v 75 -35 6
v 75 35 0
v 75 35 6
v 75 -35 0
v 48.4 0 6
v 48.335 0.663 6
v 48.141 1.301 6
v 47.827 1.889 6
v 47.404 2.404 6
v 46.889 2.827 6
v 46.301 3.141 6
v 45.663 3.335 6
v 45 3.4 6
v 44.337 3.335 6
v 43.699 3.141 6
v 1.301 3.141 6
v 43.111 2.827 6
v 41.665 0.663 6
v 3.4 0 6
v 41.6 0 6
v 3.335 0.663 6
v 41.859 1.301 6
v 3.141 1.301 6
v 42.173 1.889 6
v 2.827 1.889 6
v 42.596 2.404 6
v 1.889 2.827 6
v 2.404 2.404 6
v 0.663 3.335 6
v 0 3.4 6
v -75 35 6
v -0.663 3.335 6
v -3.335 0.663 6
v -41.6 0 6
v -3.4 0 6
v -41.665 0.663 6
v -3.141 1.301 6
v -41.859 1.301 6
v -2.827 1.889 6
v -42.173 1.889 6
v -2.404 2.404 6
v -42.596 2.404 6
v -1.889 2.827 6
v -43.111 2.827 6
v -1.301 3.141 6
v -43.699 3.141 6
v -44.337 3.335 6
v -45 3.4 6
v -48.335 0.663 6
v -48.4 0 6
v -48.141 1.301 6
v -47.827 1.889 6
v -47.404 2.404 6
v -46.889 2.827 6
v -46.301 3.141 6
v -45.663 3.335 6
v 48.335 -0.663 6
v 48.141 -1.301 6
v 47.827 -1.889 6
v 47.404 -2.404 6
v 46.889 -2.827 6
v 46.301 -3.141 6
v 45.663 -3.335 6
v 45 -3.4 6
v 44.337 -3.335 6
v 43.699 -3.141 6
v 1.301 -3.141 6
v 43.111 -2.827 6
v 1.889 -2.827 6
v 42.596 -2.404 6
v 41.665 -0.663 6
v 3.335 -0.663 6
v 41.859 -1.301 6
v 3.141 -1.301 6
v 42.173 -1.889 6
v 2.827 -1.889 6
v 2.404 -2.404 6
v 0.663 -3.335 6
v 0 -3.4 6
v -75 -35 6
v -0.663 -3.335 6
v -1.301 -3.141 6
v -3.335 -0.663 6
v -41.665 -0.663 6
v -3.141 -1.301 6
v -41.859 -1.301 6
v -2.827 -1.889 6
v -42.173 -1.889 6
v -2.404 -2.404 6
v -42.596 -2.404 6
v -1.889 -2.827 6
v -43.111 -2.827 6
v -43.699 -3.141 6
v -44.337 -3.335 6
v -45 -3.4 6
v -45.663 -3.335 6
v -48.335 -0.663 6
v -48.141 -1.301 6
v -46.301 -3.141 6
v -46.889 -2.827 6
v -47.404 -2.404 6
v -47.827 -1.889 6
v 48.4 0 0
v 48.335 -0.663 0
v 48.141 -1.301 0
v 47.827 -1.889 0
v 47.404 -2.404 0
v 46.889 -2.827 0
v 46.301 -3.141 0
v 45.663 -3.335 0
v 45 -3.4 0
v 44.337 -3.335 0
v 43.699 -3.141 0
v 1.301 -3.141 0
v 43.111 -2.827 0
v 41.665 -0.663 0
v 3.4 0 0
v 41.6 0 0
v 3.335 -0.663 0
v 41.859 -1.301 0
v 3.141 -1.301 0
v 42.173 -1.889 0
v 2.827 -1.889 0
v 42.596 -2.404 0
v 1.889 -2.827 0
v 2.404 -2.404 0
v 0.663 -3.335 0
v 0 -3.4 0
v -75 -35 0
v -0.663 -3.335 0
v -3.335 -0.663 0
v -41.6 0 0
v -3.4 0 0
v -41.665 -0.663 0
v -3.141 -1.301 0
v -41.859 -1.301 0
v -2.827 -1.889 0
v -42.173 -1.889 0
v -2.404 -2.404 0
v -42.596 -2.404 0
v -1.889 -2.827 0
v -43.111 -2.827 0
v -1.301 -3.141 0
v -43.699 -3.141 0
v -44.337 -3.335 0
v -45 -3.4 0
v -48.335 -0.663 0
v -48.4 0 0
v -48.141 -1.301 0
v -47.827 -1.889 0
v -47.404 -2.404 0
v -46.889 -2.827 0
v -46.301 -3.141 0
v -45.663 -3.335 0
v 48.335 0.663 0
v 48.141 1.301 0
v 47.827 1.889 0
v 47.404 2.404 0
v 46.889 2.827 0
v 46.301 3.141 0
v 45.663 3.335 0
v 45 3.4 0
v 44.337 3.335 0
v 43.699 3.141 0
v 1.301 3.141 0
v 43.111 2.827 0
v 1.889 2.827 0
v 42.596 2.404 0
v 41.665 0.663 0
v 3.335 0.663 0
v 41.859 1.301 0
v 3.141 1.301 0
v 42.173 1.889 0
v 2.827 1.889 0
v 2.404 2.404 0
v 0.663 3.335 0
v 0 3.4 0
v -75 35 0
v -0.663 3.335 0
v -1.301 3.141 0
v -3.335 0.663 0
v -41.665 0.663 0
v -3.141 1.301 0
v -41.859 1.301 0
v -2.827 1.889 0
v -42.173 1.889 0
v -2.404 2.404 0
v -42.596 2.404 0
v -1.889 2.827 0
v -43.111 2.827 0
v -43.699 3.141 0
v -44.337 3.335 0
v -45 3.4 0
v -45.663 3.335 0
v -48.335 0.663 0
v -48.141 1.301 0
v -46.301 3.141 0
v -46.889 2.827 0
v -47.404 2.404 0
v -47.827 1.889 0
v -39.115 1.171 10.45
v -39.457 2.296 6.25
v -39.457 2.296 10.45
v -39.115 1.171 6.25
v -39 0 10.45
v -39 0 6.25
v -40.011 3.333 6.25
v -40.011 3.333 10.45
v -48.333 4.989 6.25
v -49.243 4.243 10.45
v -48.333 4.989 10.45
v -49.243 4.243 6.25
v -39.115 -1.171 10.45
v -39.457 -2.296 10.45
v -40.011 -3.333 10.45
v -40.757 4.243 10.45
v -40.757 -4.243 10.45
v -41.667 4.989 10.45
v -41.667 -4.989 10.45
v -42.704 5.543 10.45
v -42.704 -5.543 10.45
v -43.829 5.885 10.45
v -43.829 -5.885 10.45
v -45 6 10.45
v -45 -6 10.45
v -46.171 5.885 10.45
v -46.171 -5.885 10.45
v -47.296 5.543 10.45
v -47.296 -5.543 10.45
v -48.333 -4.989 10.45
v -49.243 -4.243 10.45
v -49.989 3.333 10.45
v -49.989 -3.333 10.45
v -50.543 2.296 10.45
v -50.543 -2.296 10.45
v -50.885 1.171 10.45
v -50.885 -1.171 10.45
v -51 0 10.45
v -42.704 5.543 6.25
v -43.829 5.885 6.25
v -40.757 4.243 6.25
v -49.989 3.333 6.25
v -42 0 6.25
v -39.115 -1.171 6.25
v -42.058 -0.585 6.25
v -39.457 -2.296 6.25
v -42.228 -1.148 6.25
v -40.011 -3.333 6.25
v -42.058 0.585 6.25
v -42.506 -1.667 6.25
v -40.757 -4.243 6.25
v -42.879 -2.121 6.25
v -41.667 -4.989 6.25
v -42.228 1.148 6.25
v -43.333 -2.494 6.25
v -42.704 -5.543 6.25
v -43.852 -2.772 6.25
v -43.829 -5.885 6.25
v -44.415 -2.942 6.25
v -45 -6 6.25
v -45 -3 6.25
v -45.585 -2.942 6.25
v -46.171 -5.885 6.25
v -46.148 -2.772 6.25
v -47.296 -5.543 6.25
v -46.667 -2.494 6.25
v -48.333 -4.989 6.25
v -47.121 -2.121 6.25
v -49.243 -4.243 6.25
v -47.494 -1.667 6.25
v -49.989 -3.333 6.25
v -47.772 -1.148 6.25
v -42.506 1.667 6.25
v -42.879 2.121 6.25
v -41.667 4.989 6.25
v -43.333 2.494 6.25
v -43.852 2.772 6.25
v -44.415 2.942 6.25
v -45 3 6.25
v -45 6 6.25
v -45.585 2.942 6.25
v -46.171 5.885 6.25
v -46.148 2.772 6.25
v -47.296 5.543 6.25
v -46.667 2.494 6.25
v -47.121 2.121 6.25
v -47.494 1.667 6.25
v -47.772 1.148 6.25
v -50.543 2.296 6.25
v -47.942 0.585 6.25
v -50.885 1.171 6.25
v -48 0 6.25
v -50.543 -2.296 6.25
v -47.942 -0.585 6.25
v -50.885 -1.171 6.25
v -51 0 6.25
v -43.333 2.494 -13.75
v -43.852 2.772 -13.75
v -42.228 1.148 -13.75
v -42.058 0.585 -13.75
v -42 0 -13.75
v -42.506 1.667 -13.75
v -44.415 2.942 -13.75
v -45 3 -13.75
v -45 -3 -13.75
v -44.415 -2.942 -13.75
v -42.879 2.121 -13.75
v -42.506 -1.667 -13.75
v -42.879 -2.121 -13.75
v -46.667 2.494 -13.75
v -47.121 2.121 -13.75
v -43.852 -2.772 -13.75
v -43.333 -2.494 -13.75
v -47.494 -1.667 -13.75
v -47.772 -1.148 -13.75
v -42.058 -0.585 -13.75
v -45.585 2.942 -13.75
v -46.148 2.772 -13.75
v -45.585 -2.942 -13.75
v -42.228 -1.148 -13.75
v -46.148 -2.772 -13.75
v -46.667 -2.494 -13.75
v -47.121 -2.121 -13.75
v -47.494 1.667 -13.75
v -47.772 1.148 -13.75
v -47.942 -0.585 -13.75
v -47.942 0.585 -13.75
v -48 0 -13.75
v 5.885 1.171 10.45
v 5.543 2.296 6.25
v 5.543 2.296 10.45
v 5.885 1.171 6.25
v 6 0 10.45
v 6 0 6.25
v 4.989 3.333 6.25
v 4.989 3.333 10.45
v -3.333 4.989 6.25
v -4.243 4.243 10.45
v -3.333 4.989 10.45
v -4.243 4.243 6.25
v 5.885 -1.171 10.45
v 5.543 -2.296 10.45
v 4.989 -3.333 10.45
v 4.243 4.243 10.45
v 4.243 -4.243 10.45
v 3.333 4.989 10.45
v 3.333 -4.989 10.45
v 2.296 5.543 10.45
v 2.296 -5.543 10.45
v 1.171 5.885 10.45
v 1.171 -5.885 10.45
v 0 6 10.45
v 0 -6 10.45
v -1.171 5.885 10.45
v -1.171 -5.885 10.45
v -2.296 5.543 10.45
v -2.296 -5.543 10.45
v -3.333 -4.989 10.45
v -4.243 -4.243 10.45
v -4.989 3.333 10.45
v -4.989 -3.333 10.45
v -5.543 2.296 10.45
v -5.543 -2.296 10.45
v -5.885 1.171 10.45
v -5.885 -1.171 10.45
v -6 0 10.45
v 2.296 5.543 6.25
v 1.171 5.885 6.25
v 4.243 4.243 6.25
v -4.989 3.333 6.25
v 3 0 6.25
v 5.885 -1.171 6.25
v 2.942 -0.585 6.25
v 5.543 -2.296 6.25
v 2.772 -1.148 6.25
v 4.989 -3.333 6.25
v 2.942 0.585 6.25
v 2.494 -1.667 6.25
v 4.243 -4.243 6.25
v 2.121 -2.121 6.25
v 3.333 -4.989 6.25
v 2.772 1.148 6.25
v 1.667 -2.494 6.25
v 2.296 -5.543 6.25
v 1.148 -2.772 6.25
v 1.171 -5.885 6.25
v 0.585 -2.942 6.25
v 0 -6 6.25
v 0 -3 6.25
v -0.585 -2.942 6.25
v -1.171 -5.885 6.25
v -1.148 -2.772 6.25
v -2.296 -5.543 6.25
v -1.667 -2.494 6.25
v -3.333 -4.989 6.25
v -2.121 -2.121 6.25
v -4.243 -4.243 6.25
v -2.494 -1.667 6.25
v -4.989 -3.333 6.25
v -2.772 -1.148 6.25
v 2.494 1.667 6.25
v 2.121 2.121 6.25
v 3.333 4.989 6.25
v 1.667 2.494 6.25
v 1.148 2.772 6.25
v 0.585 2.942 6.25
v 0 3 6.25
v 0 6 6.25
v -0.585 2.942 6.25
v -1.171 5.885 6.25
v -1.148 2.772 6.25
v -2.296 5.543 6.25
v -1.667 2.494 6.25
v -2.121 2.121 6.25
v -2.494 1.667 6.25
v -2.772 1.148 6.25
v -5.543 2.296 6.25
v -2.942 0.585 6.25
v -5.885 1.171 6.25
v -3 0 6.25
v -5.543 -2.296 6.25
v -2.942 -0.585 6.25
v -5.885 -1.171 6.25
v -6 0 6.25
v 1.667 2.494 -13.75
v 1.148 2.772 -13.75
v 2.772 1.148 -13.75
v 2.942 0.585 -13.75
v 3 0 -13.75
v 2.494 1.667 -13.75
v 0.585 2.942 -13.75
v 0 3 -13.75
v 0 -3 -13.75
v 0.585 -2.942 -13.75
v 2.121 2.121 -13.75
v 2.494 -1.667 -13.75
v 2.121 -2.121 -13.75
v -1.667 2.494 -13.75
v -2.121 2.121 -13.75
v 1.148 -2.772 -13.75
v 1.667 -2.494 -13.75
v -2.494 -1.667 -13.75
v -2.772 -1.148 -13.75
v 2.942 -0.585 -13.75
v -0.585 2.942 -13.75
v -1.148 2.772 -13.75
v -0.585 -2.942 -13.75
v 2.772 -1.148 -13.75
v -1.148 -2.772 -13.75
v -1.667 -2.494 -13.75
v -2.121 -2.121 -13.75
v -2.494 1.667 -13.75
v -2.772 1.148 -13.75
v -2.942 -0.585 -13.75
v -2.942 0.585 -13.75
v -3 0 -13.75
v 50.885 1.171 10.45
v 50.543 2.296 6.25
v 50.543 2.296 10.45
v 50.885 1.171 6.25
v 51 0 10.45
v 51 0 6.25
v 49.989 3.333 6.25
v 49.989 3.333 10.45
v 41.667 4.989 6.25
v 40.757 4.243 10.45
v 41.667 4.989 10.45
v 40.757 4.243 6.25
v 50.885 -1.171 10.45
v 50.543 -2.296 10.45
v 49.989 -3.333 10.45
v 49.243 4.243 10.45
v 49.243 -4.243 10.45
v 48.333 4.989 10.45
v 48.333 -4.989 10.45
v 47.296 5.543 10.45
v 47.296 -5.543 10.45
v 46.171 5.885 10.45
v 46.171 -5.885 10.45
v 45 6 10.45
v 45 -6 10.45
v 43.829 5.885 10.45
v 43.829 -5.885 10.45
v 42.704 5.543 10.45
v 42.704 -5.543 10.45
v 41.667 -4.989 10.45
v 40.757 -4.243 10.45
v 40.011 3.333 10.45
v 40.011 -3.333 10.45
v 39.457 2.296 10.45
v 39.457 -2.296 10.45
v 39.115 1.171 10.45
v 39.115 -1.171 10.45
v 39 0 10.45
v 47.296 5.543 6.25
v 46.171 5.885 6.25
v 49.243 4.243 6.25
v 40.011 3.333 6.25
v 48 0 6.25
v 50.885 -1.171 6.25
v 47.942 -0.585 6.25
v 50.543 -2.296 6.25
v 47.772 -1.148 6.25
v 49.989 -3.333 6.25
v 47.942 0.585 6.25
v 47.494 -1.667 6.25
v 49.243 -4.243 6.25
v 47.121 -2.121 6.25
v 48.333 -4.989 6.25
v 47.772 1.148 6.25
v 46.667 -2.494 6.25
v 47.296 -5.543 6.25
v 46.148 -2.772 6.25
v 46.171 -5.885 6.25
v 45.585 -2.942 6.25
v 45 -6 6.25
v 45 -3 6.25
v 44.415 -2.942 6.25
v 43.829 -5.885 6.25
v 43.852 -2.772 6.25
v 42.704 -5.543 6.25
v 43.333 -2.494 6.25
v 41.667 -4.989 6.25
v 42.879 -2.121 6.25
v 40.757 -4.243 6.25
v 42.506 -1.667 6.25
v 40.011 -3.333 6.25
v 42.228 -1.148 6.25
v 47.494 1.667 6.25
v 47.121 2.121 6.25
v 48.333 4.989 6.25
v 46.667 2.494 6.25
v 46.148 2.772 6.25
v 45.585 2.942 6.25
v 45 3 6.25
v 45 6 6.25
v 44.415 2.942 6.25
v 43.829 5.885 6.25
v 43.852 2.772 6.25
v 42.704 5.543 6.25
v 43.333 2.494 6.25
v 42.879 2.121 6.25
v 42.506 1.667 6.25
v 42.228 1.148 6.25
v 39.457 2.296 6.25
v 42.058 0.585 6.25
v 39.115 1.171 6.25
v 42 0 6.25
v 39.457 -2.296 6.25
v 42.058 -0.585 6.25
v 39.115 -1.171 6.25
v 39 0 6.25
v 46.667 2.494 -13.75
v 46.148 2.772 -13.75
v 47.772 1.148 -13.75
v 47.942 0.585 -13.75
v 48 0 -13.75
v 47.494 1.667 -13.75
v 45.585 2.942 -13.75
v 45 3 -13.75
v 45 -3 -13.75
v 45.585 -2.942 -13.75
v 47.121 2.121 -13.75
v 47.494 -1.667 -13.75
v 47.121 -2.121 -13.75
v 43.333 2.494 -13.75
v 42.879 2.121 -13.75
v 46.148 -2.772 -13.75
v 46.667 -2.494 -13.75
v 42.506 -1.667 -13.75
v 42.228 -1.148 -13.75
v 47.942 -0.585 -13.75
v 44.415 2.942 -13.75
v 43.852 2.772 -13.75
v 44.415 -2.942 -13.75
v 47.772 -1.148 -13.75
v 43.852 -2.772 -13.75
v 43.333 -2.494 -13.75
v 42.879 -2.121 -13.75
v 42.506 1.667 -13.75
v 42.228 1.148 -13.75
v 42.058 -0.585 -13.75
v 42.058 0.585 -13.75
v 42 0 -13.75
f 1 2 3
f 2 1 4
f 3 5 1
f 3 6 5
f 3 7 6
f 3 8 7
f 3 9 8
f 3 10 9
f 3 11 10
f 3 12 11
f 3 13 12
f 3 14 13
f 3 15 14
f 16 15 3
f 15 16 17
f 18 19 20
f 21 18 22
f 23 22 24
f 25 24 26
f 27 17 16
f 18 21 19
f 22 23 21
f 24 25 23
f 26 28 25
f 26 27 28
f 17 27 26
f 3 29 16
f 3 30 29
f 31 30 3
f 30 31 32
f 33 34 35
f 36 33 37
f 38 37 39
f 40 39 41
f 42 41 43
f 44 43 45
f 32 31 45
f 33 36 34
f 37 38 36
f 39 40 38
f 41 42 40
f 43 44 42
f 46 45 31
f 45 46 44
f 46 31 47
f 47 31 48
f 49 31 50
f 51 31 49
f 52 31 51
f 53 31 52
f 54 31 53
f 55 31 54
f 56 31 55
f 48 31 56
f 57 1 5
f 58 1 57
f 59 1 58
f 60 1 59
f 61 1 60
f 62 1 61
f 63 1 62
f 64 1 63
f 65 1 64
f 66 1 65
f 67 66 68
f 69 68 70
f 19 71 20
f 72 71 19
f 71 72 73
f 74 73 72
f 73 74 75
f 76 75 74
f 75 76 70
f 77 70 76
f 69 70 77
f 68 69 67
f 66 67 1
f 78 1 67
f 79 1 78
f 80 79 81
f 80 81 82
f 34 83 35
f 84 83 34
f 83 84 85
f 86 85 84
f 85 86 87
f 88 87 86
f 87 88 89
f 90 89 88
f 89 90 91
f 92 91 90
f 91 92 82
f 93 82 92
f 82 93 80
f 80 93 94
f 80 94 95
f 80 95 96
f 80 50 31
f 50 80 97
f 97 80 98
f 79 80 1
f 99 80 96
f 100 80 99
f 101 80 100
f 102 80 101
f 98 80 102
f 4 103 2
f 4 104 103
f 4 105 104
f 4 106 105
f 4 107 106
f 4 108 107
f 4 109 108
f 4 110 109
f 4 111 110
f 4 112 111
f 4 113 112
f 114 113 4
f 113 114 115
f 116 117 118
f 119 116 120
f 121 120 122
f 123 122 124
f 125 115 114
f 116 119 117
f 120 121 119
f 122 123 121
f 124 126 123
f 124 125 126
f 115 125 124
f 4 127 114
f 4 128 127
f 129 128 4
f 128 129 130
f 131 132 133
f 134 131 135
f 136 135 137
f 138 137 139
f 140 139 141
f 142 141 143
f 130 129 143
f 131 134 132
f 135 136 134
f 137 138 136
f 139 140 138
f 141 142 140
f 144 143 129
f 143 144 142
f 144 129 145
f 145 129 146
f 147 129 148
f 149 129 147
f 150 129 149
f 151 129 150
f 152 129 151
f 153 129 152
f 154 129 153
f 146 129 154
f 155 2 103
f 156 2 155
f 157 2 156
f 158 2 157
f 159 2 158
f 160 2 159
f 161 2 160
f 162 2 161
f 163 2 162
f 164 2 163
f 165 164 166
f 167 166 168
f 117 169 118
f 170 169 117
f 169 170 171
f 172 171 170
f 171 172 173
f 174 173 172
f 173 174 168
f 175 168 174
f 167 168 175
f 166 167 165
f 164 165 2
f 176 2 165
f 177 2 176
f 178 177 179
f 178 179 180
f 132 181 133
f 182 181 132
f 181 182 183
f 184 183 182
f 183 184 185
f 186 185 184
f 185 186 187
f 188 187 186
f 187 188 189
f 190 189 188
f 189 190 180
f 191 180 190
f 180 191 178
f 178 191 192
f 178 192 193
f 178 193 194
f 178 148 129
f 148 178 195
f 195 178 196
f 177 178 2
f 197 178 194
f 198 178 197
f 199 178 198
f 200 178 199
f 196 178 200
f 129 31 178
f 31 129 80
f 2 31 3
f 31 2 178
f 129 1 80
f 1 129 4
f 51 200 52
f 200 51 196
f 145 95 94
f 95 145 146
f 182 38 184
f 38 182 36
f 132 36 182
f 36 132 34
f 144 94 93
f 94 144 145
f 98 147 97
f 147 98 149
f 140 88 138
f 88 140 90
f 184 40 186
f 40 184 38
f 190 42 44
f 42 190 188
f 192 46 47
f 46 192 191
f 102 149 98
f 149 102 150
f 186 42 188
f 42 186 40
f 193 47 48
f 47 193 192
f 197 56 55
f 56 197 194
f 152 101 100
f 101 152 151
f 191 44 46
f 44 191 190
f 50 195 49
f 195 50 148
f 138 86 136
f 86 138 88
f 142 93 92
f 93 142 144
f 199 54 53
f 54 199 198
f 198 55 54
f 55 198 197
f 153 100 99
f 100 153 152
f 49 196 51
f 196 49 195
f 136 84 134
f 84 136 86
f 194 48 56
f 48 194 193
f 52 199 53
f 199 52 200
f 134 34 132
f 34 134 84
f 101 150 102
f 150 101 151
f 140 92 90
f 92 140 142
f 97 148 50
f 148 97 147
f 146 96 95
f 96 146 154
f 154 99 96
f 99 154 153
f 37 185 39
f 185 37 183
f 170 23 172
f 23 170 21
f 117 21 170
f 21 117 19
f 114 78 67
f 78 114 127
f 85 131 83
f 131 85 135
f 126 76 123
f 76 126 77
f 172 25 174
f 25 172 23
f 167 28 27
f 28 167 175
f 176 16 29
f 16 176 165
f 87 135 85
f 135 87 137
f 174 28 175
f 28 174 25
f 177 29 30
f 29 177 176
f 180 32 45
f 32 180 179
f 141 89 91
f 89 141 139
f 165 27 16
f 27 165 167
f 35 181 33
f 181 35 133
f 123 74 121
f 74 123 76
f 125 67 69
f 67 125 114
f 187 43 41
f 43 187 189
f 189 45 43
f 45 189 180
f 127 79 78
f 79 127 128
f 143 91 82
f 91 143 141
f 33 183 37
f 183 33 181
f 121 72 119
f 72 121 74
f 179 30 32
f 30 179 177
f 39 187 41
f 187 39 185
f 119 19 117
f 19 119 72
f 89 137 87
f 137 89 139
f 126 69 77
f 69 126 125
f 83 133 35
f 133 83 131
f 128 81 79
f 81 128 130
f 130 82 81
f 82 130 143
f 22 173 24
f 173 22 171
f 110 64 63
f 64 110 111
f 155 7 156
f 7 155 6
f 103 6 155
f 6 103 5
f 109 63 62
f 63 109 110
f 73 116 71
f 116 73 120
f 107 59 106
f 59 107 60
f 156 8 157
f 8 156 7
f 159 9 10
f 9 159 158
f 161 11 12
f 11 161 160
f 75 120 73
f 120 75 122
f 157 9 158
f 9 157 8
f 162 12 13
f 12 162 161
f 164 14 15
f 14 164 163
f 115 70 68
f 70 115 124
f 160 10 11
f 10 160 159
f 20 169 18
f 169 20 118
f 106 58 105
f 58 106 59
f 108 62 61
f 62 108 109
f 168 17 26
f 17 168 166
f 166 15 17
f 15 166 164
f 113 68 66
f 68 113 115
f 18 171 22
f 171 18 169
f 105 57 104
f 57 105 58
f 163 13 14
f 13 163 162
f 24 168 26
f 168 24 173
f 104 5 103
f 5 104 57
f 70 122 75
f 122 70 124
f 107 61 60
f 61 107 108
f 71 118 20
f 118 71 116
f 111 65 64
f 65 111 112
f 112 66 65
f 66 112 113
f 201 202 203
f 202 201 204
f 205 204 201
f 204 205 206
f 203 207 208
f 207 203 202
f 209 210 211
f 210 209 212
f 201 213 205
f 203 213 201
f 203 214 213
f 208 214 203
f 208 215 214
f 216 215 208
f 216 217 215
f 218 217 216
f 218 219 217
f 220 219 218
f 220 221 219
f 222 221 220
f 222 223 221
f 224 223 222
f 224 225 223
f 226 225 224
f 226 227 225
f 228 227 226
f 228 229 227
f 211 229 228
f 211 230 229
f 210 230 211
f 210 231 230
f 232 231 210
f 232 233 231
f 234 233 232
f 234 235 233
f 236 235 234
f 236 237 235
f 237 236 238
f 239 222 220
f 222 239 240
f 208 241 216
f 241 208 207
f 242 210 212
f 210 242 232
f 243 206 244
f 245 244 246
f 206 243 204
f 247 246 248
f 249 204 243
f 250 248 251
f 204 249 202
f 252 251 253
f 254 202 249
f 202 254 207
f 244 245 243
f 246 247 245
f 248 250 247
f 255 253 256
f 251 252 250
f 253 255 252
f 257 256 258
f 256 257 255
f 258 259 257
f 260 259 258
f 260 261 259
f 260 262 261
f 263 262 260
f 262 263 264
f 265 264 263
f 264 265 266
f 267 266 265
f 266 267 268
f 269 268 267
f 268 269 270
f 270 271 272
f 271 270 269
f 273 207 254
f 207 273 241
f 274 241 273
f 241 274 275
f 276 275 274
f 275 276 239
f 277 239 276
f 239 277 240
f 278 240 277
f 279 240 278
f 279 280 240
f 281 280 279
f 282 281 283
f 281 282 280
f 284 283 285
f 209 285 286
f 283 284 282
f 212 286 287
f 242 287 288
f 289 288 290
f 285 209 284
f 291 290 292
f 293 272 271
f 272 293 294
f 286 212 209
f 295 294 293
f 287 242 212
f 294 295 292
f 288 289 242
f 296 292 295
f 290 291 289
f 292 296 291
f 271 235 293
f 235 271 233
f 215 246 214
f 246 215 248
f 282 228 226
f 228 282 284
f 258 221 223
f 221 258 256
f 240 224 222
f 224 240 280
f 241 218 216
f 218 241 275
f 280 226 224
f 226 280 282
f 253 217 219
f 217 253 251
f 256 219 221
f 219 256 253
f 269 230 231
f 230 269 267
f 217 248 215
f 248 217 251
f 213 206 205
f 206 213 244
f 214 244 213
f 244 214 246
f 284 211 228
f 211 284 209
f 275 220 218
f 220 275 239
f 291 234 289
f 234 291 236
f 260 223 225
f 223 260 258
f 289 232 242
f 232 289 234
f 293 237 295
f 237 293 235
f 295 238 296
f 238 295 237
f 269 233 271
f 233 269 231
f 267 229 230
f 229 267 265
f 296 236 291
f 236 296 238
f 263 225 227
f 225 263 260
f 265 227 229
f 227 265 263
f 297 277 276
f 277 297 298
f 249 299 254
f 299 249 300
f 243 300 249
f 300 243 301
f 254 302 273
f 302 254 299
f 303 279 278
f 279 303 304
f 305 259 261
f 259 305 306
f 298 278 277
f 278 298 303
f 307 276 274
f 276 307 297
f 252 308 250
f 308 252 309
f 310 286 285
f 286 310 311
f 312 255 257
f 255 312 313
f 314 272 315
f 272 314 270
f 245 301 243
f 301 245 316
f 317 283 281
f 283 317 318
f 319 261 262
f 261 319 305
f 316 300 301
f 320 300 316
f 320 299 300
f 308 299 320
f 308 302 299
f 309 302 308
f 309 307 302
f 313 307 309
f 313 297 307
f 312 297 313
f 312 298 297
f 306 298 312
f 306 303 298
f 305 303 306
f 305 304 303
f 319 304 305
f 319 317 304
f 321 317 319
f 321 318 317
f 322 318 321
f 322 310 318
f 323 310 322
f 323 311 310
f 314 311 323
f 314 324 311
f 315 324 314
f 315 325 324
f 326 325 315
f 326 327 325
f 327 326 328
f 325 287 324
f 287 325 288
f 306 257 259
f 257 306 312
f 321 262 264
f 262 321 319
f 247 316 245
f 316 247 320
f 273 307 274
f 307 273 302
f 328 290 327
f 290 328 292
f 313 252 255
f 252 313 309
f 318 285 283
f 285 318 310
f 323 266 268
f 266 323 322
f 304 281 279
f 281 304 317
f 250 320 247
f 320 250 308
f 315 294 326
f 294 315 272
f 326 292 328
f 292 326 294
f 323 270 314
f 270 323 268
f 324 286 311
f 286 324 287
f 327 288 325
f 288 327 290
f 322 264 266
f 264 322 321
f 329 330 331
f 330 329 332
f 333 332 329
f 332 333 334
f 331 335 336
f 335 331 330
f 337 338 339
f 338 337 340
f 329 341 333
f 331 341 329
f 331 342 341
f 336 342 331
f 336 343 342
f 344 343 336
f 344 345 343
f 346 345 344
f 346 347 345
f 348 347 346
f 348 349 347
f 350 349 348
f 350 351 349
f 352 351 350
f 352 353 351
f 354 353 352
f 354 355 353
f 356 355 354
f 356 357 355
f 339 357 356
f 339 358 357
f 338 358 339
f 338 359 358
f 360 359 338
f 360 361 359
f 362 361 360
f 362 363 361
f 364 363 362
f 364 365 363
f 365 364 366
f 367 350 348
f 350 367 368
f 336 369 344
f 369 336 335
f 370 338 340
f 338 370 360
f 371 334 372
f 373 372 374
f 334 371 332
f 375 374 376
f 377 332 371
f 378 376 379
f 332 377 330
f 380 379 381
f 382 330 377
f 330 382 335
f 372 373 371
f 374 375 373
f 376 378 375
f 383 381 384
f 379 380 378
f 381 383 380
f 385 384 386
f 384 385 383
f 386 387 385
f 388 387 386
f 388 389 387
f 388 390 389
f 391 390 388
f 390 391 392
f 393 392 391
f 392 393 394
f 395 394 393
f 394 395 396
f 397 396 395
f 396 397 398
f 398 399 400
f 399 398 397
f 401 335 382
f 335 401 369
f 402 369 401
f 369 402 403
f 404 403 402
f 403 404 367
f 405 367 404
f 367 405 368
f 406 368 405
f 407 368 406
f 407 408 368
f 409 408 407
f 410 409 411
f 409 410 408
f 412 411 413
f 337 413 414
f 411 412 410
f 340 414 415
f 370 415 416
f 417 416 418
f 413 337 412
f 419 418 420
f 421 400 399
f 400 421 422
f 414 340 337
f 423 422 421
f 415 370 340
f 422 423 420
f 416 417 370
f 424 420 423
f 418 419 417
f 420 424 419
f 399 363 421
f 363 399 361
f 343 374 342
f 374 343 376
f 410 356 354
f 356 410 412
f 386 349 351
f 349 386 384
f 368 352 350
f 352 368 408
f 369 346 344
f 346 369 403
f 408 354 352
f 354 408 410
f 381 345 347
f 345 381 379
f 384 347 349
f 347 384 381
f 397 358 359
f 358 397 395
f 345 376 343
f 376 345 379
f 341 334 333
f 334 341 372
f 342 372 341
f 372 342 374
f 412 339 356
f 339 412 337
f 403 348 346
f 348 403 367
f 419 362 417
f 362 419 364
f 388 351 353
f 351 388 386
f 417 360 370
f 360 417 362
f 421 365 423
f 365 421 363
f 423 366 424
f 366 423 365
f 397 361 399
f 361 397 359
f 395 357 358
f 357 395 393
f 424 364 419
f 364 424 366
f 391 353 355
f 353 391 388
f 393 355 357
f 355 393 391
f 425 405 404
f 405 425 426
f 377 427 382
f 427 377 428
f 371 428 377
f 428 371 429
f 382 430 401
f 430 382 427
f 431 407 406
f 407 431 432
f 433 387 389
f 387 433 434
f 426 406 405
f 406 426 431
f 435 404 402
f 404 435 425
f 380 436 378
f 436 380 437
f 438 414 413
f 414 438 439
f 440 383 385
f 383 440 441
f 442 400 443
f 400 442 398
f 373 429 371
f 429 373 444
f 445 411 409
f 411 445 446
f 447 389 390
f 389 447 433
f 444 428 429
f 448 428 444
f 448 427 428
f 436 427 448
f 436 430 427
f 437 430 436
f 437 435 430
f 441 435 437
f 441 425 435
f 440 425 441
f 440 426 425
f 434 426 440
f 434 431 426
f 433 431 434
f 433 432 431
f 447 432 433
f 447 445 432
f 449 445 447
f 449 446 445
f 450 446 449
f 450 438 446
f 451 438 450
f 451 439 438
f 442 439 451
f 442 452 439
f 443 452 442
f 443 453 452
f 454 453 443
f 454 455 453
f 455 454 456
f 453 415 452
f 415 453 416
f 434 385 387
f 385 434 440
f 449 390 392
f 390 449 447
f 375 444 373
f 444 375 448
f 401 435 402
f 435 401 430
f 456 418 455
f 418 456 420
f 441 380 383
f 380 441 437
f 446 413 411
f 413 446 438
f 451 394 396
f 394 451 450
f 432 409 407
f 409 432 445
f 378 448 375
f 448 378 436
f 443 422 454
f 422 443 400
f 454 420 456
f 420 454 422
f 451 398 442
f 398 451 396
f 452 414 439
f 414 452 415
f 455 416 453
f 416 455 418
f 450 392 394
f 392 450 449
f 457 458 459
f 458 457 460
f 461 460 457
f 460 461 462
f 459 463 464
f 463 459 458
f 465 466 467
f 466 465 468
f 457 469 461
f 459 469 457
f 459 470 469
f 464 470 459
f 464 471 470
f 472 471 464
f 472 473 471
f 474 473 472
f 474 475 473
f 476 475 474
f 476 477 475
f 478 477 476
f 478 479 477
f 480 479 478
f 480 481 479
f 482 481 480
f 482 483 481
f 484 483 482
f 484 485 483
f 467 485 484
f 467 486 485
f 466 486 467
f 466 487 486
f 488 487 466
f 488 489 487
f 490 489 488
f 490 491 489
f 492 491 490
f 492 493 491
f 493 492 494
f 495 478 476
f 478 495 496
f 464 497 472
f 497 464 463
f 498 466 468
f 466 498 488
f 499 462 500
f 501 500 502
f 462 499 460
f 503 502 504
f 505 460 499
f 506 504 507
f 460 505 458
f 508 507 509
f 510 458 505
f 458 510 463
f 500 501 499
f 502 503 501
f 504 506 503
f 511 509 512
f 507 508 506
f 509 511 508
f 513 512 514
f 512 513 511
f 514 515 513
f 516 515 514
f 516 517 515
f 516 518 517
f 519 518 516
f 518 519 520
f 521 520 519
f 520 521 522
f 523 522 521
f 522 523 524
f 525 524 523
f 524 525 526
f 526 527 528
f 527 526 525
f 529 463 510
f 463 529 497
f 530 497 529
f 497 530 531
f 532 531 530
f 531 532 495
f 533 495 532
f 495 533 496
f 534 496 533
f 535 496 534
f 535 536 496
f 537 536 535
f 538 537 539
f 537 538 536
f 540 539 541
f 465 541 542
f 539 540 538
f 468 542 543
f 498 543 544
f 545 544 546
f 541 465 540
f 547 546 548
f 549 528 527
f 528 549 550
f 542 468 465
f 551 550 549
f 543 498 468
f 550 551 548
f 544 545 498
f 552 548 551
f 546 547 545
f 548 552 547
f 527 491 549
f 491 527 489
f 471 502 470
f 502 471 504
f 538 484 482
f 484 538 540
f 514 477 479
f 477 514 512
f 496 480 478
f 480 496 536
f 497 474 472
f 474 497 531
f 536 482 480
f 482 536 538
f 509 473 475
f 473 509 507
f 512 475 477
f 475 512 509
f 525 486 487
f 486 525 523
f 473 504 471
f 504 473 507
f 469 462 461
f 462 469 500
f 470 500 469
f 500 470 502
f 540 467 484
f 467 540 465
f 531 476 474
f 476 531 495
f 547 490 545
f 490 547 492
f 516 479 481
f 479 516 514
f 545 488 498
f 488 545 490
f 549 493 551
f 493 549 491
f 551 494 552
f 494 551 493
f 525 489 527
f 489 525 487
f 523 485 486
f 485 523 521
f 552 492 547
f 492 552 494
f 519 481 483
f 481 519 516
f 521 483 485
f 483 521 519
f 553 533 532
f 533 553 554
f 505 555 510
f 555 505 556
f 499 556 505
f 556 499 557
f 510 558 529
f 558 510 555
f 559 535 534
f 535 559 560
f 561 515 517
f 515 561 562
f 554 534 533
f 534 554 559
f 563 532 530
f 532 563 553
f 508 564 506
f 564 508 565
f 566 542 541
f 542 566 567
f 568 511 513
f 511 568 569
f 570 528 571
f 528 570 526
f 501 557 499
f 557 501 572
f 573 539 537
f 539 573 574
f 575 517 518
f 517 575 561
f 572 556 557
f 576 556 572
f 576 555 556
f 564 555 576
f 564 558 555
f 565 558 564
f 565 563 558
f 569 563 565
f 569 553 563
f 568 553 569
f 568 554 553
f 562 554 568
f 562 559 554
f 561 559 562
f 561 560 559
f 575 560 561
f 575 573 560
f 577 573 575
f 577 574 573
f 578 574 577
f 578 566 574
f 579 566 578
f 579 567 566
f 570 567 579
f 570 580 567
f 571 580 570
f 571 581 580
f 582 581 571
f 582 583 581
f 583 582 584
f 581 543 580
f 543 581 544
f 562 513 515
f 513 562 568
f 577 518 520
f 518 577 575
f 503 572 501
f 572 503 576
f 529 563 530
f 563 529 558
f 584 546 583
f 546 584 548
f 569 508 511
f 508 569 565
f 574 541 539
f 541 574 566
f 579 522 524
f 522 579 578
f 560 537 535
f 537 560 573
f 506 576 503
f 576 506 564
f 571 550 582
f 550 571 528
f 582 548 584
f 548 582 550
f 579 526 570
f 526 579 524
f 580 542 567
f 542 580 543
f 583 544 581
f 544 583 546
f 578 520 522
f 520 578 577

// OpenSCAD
$fn = 32;

// ------------------------------------------------------------------------
// Bolted plate: 150 x 70 x 6 mm plate, 3 fasteners
// Every part is its own module, assembly() places them once.
// ------------------------------------------------------------------------

// --- part 1 ---
module plate() {
  difference() {
    translate([-75, -35, 0]) cube([150, 70, 6]);
    translate([-45, 0, -1]) cylinder(h = 8, d = 6.8);
    translate([0, 0, -1]) cylinder(h = 8, d = 6.8);
    translate([45, 0, -1]) cylinder(h = 8, d = 6.8);
  }
}

// --- part 2 ---
module bolt1() {
  cylinder(h = 4.2, d = 12);
  translate([0, 0, -20]) cylinder(h = 20, d = 6);
}

// --- part 3 ---
module bolt2() {
  cylinder(h = 4.2, d = 12);
  translate([0, 0, -20]) cylinder(h = 20, d = 6);
}

// --- part 4 ---
module bolt3() {
  cylinder(h = 4.2, d = 12);
  translate([0, 0, -20]) cylinder(h = 20, d = 6);
}

// --- assembly ---
module assembly() {
  translate([0, 0, 0]) rotate([0, 0, 0]) plate();
  translate([-45, 0, 6.25]) rotate([0, 0, 0]) bolt1();
  translate([0, 0, 6.25]) rotate([0, 0, 0]) bolt2();
  translate([45, 0, 6.25]) rotate([0, 0, 0]) bolt3();
}

assembly();
